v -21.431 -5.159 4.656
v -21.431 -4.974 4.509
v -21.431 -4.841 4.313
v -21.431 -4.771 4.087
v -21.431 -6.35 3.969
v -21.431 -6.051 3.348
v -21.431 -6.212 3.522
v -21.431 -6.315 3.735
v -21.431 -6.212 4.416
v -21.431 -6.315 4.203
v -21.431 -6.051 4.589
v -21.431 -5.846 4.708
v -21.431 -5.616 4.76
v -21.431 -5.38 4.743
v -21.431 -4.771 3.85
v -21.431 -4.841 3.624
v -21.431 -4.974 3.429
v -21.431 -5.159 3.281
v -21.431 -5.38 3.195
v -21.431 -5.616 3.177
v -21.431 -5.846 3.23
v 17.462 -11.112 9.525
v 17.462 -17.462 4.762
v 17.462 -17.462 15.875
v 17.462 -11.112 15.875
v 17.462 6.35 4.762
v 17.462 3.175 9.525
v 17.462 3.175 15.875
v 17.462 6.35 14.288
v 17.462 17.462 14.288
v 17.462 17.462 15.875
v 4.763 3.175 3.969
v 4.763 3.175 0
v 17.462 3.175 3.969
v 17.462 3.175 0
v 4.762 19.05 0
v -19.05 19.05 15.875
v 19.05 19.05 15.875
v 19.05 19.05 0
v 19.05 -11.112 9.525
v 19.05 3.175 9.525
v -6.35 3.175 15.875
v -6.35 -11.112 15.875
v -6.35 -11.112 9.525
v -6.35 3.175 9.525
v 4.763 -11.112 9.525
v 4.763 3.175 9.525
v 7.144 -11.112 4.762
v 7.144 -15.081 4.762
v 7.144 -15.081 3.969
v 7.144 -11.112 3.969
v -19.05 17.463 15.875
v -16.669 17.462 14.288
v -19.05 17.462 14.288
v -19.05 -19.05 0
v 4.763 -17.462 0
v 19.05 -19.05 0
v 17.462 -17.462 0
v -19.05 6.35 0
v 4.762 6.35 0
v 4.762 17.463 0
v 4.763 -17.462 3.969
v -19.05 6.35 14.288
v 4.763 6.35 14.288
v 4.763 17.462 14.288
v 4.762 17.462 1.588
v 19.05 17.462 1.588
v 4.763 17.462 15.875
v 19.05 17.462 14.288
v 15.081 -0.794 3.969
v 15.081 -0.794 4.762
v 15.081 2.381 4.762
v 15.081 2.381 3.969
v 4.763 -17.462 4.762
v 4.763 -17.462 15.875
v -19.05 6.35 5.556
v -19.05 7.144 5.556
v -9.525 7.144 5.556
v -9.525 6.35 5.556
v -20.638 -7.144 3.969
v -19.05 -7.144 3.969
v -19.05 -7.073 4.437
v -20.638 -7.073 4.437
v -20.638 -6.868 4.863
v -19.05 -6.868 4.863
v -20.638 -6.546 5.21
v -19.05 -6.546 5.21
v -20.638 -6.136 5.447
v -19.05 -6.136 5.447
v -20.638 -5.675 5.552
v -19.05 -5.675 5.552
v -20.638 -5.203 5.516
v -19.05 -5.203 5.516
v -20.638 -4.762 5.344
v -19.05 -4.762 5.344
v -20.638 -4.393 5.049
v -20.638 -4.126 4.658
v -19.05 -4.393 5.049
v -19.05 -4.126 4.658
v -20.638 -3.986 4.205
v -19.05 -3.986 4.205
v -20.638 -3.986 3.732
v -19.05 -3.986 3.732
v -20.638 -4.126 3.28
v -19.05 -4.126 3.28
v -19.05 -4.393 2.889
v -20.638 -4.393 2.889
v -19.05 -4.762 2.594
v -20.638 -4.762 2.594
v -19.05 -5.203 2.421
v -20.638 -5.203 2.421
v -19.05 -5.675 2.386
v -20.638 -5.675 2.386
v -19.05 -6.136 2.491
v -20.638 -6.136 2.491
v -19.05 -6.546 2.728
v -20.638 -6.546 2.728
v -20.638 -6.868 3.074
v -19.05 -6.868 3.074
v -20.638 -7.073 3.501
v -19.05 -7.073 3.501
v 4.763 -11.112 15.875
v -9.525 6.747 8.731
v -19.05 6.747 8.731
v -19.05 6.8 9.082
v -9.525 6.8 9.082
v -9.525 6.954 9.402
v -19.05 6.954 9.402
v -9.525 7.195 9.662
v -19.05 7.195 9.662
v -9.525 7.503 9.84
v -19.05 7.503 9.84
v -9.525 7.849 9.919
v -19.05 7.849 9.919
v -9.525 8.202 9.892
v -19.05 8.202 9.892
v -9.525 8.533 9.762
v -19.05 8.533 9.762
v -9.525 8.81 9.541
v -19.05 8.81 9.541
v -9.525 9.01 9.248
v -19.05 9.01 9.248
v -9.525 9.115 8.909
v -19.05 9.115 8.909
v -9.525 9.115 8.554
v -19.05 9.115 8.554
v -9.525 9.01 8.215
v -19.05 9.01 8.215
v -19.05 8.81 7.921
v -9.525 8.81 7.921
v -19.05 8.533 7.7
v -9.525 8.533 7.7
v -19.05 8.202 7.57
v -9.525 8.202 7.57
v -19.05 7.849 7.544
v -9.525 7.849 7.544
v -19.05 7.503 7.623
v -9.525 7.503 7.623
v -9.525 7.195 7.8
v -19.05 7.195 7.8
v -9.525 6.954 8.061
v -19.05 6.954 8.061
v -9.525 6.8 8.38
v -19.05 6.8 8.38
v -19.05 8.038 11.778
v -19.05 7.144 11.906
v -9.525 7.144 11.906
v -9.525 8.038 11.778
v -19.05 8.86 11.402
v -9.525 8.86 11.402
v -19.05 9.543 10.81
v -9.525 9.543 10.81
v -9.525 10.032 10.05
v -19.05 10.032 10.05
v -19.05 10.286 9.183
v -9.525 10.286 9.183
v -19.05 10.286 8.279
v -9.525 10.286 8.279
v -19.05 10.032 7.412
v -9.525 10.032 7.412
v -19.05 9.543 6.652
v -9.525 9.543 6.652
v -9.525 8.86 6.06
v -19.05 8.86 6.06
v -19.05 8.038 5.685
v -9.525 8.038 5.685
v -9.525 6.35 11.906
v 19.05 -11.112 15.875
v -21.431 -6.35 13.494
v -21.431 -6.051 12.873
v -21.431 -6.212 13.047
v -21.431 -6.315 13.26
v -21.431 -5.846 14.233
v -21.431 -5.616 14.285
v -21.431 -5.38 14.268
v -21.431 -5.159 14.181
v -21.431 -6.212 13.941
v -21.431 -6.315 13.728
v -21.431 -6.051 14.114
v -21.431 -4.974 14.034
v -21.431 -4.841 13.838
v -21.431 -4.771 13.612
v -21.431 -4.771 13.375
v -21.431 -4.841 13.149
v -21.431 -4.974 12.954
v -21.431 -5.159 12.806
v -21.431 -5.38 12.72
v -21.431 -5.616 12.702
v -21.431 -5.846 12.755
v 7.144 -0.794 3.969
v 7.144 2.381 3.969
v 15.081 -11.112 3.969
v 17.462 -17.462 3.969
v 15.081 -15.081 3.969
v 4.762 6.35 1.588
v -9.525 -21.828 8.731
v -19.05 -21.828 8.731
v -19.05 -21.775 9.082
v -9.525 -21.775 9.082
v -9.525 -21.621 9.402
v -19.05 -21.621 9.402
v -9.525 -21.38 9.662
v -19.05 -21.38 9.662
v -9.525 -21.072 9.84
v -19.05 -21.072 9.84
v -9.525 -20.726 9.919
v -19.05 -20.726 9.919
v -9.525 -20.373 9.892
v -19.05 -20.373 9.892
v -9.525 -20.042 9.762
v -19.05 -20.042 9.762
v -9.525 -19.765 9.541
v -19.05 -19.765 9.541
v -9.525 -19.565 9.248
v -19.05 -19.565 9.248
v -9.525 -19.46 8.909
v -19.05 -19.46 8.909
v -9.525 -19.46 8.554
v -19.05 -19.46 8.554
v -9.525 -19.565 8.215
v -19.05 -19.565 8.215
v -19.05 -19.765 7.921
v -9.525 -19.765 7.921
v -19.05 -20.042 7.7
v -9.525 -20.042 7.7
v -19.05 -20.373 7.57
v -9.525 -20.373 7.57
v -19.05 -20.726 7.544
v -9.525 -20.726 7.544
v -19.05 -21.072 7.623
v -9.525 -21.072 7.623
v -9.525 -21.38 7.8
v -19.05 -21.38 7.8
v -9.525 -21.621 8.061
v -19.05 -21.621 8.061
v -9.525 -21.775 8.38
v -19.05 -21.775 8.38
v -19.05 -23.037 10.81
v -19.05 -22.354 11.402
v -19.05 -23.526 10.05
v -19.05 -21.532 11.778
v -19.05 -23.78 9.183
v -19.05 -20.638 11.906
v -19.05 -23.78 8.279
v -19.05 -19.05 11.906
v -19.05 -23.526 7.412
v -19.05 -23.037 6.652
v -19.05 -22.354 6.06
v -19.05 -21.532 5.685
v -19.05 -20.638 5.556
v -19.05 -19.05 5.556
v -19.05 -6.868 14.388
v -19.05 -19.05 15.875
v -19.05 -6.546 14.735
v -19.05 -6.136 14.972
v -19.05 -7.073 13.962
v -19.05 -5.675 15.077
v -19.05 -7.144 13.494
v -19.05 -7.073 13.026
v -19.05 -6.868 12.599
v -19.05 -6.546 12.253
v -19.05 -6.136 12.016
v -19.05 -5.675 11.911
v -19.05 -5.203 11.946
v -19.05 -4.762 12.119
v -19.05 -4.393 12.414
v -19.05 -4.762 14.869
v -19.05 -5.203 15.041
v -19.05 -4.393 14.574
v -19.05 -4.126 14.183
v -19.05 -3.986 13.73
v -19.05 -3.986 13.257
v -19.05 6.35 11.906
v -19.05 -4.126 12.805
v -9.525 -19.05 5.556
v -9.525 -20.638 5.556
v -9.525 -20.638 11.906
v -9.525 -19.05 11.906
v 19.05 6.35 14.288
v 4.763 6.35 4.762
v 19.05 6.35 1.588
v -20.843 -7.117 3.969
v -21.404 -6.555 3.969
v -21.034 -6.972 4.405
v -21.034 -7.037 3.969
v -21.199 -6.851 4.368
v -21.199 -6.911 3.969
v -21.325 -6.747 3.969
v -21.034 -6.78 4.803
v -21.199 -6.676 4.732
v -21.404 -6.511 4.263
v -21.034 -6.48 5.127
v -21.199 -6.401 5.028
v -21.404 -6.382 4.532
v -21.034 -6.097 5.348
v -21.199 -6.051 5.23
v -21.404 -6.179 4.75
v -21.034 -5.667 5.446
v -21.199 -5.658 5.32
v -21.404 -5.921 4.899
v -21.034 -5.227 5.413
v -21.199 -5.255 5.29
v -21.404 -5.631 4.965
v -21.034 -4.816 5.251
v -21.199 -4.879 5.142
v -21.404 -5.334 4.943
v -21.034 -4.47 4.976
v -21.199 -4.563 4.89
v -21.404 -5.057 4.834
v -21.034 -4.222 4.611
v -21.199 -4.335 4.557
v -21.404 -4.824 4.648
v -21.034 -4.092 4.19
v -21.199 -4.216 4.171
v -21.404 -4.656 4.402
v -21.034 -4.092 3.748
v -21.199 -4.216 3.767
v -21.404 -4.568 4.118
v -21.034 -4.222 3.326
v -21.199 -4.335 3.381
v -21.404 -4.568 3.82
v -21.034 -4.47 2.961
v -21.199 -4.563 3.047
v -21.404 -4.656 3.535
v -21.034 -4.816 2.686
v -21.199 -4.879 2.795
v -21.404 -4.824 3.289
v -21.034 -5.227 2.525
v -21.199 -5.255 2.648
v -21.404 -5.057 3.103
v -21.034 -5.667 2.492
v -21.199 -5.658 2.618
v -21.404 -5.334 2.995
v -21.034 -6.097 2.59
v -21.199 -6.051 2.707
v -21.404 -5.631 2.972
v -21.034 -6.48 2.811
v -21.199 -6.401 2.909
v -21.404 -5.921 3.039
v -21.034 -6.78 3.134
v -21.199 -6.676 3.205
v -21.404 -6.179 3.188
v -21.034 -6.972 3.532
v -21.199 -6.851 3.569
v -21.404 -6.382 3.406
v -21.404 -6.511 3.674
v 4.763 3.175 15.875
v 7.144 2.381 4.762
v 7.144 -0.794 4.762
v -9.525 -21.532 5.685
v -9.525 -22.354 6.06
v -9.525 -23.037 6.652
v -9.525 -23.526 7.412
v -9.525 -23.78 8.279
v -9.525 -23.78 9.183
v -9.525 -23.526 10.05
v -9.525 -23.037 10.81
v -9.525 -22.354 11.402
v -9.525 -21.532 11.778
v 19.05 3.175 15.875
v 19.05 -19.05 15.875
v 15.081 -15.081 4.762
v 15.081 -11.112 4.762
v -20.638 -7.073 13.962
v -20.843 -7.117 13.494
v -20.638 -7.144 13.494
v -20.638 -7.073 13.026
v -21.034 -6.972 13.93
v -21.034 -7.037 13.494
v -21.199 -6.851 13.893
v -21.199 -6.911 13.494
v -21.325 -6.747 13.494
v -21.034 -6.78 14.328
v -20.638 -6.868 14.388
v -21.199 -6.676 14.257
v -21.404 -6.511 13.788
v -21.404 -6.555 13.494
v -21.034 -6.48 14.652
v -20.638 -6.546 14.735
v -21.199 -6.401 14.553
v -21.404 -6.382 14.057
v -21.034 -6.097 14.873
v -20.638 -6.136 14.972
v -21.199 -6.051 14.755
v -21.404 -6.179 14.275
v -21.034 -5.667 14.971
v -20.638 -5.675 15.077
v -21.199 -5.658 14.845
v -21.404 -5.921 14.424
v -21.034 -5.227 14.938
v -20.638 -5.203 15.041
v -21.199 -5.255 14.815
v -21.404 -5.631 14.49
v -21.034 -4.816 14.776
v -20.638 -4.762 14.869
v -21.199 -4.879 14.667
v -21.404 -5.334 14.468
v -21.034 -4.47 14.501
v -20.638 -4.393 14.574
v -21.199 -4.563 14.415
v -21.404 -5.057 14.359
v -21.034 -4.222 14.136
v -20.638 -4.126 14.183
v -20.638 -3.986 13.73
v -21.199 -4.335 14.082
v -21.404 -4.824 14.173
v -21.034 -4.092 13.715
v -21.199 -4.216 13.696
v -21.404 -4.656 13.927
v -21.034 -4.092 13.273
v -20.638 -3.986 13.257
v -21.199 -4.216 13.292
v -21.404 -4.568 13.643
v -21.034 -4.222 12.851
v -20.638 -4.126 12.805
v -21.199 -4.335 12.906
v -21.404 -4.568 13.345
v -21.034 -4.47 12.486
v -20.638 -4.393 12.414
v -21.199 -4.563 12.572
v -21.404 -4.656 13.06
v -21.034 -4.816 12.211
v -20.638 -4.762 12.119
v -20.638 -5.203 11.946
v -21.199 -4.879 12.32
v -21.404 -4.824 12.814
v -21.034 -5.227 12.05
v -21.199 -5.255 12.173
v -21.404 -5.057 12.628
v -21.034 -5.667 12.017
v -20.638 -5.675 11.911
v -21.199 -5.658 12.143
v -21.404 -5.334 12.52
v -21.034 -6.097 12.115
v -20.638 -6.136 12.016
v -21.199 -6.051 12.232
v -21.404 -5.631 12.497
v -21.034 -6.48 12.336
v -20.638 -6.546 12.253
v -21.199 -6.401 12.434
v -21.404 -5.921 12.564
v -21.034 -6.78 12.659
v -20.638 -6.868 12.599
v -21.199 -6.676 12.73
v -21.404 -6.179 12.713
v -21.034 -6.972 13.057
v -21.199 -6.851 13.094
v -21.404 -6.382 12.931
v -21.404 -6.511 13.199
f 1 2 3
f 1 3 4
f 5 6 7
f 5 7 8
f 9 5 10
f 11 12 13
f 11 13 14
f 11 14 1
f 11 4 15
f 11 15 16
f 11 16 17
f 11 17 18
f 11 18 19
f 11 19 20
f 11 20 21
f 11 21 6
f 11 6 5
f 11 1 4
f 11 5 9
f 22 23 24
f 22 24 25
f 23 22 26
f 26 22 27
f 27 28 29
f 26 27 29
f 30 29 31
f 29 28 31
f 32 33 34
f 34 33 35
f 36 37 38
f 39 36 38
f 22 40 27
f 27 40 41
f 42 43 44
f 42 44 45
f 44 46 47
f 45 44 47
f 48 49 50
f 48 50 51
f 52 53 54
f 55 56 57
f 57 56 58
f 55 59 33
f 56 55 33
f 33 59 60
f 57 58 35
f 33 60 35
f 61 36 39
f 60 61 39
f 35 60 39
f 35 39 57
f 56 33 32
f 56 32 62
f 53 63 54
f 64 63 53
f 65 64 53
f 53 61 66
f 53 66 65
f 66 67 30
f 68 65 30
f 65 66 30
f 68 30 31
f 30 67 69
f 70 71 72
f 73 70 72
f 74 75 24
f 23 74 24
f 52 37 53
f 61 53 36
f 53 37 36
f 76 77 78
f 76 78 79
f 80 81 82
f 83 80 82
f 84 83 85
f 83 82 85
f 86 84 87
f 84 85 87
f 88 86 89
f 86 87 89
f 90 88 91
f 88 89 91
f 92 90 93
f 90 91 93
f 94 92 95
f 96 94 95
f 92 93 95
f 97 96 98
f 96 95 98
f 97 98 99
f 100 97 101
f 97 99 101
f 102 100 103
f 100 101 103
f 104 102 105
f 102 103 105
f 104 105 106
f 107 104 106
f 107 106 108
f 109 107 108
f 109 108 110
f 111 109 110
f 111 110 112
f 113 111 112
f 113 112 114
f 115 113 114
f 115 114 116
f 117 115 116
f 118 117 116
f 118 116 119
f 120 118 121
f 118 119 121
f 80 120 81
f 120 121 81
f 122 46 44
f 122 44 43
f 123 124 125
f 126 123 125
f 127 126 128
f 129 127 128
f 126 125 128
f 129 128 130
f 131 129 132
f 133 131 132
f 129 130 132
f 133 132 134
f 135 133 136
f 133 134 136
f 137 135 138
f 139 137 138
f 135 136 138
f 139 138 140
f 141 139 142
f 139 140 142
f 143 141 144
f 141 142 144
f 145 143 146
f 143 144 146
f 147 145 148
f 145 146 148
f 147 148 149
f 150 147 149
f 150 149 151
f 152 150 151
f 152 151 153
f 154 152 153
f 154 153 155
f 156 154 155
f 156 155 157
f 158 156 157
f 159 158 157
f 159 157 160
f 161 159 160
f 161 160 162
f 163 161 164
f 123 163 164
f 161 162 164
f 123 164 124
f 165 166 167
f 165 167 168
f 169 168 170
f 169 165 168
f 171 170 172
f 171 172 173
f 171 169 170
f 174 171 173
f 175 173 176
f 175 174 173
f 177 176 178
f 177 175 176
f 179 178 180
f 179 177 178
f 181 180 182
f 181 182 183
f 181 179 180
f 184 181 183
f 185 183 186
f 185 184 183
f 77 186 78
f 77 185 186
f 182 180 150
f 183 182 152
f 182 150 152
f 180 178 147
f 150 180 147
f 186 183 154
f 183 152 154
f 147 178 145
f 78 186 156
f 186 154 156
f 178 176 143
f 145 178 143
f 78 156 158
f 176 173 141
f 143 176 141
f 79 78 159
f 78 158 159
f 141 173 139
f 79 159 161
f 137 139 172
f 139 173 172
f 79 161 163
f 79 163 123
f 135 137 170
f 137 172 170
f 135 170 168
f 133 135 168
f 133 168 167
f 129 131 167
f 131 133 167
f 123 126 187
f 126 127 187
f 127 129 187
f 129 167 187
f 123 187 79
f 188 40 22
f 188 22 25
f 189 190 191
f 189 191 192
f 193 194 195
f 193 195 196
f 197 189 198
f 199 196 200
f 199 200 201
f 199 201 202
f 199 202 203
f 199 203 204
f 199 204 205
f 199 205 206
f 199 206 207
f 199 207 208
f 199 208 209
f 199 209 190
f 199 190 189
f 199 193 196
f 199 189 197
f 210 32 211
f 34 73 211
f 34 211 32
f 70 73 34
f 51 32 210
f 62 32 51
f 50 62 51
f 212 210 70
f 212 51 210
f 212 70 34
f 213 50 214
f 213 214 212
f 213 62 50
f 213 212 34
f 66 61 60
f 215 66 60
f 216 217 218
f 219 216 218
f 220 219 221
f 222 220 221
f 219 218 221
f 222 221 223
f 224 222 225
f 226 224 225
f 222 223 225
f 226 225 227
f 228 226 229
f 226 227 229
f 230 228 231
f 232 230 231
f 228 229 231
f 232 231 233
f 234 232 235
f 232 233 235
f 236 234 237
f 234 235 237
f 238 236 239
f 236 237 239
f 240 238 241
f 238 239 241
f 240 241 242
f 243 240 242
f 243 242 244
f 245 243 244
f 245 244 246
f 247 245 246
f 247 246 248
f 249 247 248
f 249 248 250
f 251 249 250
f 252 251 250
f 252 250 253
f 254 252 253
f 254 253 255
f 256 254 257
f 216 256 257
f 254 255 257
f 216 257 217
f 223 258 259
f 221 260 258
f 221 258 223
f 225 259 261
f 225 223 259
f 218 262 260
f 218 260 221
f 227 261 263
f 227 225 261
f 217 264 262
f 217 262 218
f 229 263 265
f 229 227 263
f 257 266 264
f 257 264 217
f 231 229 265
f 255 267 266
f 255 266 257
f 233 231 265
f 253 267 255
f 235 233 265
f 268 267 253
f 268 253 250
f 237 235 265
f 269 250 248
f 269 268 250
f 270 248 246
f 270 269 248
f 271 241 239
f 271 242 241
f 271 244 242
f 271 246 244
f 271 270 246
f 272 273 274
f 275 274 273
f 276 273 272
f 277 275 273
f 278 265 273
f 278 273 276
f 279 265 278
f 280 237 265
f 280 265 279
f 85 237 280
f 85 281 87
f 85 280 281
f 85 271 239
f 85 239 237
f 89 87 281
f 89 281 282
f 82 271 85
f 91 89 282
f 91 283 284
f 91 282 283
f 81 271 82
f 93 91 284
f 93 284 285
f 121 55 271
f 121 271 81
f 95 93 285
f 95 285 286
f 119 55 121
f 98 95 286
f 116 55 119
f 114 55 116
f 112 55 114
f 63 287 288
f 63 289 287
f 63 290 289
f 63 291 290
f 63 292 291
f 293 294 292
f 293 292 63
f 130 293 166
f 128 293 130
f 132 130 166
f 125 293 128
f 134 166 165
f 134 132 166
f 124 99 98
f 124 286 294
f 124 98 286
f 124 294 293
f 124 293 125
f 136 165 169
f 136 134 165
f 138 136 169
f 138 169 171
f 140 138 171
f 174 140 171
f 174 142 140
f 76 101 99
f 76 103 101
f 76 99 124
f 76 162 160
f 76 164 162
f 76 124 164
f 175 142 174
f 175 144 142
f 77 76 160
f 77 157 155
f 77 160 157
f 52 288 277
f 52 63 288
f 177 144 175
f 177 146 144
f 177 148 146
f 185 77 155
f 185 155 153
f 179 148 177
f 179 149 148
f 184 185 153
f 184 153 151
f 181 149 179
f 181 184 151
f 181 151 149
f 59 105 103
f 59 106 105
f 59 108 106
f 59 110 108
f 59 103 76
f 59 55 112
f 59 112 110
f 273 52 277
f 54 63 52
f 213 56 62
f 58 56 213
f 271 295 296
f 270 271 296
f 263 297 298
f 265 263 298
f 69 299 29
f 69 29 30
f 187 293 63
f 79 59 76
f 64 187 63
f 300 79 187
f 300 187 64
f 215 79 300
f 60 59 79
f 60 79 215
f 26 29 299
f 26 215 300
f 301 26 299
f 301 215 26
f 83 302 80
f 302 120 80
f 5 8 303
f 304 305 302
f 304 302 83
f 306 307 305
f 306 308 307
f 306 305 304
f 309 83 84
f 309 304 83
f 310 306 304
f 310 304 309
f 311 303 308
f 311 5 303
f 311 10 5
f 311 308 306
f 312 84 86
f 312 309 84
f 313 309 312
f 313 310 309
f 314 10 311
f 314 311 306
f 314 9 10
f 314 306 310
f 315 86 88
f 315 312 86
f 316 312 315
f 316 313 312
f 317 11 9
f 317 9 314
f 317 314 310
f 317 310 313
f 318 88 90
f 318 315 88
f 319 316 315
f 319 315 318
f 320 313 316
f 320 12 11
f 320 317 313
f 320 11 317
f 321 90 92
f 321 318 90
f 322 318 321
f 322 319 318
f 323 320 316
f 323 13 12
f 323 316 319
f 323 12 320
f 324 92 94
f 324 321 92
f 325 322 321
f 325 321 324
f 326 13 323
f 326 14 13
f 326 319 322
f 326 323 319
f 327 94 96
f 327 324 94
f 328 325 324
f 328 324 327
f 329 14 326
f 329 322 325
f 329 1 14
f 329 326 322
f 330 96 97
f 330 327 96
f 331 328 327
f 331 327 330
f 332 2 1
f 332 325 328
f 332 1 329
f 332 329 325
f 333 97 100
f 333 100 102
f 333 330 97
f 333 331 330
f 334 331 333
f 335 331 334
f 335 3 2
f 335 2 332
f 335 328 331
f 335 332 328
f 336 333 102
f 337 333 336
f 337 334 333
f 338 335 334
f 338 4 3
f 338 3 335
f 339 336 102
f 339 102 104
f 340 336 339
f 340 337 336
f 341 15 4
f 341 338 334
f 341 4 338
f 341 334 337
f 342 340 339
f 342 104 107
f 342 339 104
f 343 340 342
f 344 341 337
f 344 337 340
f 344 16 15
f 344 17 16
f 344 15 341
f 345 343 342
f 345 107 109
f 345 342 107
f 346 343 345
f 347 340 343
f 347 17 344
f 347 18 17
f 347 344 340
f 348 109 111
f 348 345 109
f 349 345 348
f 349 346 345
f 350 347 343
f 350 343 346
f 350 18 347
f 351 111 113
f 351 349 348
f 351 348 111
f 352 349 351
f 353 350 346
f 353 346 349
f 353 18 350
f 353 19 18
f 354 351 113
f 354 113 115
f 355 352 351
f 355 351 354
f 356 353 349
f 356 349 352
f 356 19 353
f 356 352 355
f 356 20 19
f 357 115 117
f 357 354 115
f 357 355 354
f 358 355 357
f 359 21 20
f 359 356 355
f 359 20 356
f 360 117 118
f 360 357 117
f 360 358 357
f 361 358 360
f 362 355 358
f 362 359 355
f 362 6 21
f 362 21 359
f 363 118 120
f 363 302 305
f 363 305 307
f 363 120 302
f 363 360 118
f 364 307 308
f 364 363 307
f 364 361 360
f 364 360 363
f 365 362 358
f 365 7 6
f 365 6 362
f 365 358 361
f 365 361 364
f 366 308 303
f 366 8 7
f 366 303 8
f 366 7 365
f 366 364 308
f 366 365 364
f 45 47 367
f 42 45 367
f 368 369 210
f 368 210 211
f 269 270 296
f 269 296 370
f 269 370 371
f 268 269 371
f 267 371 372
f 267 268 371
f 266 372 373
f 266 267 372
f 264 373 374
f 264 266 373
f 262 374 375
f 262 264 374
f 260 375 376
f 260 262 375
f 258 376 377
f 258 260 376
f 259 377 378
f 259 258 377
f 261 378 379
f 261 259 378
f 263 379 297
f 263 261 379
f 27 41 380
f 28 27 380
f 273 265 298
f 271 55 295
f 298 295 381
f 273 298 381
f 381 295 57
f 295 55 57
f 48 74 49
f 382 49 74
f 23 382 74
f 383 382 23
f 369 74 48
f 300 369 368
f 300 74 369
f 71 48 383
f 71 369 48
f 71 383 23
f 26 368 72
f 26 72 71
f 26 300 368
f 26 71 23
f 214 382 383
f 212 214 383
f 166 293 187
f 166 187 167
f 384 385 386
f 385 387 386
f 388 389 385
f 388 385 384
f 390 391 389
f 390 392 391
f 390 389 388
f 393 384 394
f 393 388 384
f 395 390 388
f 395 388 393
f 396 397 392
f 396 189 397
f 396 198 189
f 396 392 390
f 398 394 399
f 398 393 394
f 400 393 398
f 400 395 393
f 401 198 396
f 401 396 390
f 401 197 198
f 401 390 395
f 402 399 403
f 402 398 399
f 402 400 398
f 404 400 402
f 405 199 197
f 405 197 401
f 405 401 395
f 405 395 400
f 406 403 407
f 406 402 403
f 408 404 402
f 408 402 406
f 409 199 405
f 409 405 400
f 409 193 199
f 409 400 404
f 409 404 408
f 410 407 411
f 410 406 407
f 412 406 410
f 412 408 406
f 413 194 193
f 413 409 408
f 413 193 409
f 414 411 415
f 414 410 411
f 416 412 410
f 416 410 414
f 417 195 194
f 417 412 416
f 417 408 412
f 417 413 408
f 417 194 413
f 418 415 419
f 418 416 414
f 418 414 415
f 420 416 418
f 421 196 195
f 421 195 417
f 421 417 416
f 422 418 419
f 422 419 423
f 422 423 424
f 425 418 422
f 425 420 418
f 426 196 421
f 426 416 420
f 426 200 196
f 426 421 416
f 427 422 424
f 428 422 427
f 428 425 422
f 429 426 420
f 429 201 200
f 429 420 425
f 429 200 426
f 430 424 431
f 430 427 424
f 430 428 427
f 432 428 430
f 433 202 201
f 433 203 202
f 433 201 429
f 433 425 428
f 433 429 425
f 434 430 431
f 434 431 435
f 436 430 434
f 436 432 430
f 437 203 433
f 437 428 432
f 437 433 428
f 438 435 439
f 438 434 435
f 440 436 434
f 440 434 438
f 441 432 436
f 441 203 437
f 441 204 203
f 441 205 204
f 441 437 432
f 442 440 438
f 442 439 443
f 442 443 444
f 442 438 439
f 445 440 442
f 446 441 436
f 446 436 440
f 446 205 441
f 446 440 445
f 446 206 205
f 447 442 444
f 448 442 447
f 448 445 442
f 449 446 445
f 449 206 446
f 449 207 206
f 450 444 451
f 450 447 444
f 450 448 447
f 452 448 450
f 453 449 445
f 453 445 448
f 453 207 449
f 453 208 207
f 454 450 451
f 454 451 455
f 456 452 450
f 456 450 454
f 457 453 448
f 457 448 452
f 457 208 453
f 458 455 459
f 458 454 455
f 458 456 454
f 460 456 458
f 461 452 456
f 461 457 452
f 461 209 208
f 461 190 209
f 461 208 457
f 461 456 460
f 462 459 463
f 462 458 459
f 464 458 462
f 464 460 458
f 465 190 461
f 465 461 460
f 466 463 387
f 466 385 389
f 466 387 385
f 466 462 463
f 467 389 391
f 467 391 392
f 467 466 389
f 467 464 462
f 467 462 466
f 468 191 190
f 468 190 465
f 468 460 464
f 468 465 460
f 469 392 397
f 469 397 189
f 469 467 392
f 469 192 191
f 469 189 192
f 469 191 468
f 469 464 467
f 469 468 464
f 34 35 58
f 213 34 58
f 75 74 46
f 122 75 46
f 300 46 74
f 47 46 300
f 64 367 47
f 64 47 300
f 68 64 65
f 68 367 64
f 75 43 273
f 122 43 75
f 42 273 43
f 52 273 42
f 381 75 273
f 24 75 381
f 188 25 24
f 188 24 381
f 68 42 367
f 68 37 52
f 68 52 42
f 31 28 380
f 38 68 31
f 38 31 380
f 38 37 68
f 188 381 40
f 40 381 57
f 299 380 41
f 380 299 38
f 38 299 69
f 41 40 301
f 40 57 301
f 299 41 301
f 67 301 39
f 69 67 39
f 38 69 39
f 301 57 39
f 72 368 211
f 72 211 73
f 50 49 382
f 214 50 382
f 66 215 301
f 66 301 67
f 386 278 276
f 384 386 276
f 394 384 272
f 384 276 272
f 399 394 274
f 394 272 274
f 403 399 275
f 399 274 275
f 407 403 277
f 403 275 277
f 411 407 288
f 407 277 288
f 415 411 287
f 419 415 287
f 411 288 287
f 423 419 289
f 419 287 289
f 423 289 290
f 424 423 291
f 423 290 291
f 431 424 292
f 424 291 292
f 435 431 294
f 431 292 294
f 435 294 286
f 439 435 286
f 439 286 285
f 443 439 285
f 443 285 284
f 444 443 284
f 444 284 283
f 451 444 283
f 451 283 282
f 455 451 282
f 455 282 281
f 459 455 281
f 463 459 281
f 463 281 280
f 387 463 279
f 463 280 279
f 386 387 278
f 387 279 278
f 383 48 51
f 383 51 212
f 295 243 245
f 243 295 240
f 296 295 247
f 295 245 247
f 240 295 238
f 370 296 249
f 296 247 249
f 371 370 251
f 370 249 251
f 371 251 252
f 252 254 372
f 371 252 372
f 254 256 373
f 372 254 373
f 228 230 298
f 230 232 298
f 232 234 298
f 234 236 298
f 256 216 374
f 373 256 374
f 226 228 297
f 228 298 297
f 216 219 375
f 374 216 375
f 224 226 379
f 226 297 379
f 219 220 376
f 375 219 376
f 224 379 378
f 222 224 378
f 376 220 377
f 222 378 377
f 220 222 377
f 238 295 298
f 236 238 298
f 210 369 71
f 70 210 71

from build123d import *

# Parameters (mm, degrees)
F0_W      = 38.1
F0_H      = 38.1
F1_DEPTH  = 15.875
F2_W      = 12.7
F2_H      = 34.925
F3_DEPTH  = 11.1125
F4_W      = 11.1125
F4_H      = 12.7
F5_DEPTH  = 38.101
F6_W      = 23.8125
F6_H      = 11.1125
F7_DEPTH  = 1.5875
F8_W      = 7.9375
F8_H      = 3.175
F8_H_2    = 3.96875
F9_DEPTH  = 4.7625
F11_DEPTH = 1.5875
F12_R     = 1.190625
F13_DEPTH = 9.525
F14_R     = 1.190625
F15_DEPTH = 9.525
F16_W     = 12.7
F16_H     = 20.6375
F17_DEPTH = 3.96875
F18_W     = 14.2875
F18_H     = 6.35
F19_DEPTH = 25.4
F20_R     = 1.5875
F21_DEPTH = 2.38125
F22_R     = 0.79375


with BuildPart() as f1:
    # F0 (on Top) → F1 (new body)
    with BuildSketch(Plane.XY):
        Rectangle(F0_W, F0_H)
    extrude(amount=F1_DEPTH)

    # F2 (on face) → F3 (cut)
    with BuildSketch(Plane.XY.offset(15.875)):
        with Locations((11.1125, 0)):
            Rectangle(F2_W, F2_H)
    extrude(amount=-F3_DEPTH, mode=Mode.SUBTRACT)

    # F4 (on face) → F5 (cut, through all)
    with BuildSketch(Plane.YZ.offset(19.05)):
        with Locations((11.90625, 7.9375)):
            Rectangle(F4_W, F4_H)
    extrude(amount=-F5_DEPTH, mode=Mode.SUBTRACT)

    # F6 (on face) → F7 (cut, through all)
    with BuildSketch(Plane(origin=(0, 0, 0), x_dir=(1, 0, 0), z_dir=(0, 0, -1))):
        with Locations((-7.14375, -11.90625)):
            Rectangle(F6_W, F6_H)
    extrude(amount=-F7_DEPTH, mode=Mode.SUBTRACT)

    # F8 (on face) → F9 (cut, through all)
    with BuildSketch(Plane.XY.offset(4.7625)):
        with Locations((11.1125, 0.79375)):
            Rectangle(F8_W, F8_H)
        with Locations((11.1125, -13.096875)):
            Rectangle(F8_W, F8_H_2)
    extrude(amount=-F9_DEPTH, mode=Mode.SUBTRACT)

    # F10 (on face) → F11 (cut)
    with BuildSketch(Plane(origin=(0, 19.05, 0), x_dir=(-1, 0, 0), z_dir=(0, 1, 0))):
        Polygon((19.05, 0), (19.05, 15.875), (-4.7625, 0), align=None)
    extrude(amount=-F11_DEPTH, mode=Mode.SUBTRACT)

    # F12 (on face) → F13 (join)
    with BuildSketch(Plane(origin=(-19.05, 0, 0), x_dir=(0, -1, 0), z_dir=(-1, 0, 0))):
        with BuildLine():
            Line((-6.35, 5.55625), (-6.35, 11.90625))
            Line((-6.35, 11.90625), (-7.14375, 11.90625))
            ThreePointArc((-7.14375, 11.90625), (-10.31875, 8.73125), (-7.14375, 5.55625))
            Line((-7.14375, 5.55625), (-6.35, 5.55625))
        make_face()
        with Locations((-7.9375, 8.73125)):
            Circle(F12_R, mode=Mode.SUBTRACT)
    extrude(amount=-F13_DEPTH)

    # F14 (on face) → F15 (join)
    with BuildSketch(Plane(origin=(-19.05, 0, 0), x_dir=(0, -1, 0), z_dir=(-1, 0, 0))):
        with BuildLine():
            Line((20.6375, 11.90625), (19.05, 11.90625))
            Line((19.05, 11.90625), (19.05, 5.55625))
            Line((19.05, 5.55625), (20.6375, 5.55625))
            ThreePointArc((20.6375, 5.55625), (23.8125, 8.73125), (20.6375, 11.90625))
        make_face()
        with Locations((20.6375, 8.73125)):
            Circle(F14_R, mode=Mode.SUBTRACT)
    extrude(amount=-F15_DEPTH)

    # F16 (on face) → F17 (cut)
    with BuildSketch(Plane(origin=(0, 0, 0), x_dir=(1, 0, 0), z_dir=(0, 0, -1))):
        with Locations((11.1125, 7.14375)):
            Rectangle(F16_W, F16_H)
    extrude(amount=-F17_DEPTH, mode=Mode.SUBTRACT)

    # F18 (on face) → F19 (cut)
    with BuildSketch(Plane.YZ.offset(19.05)):
        with Locations((-3.96875, 12.7)):
            Rectangle(F18_W, F18_H)
    extrude(amount=-F19_DEPTH, mode=Mode.SUBTRACT)

    # F20 (on face) → F21 (join)
    with BuildSketch(Plane(origin=(-19.05, 0, 0), x_dir=(0, -1, 0), z_dir=(-1, 0, 0))):
        with Locations((5.55625, 13.49375)):
            Circle(F20_R)
        with Locations((5.55625, 3.96875)):
            Circle(F20_R)
    extrude(amount=F21_DEPTH)

    # F22
    f22_edges = [f1.edges().sort_by_distance(p)[0] for p in [
        (-21.43125, -3.96875, 13.49375),
        (-21.43125, -3.96875, 3.96875),
    ]]
    fillet(f22_edges, radius=F22_R)


solid = f1.part
